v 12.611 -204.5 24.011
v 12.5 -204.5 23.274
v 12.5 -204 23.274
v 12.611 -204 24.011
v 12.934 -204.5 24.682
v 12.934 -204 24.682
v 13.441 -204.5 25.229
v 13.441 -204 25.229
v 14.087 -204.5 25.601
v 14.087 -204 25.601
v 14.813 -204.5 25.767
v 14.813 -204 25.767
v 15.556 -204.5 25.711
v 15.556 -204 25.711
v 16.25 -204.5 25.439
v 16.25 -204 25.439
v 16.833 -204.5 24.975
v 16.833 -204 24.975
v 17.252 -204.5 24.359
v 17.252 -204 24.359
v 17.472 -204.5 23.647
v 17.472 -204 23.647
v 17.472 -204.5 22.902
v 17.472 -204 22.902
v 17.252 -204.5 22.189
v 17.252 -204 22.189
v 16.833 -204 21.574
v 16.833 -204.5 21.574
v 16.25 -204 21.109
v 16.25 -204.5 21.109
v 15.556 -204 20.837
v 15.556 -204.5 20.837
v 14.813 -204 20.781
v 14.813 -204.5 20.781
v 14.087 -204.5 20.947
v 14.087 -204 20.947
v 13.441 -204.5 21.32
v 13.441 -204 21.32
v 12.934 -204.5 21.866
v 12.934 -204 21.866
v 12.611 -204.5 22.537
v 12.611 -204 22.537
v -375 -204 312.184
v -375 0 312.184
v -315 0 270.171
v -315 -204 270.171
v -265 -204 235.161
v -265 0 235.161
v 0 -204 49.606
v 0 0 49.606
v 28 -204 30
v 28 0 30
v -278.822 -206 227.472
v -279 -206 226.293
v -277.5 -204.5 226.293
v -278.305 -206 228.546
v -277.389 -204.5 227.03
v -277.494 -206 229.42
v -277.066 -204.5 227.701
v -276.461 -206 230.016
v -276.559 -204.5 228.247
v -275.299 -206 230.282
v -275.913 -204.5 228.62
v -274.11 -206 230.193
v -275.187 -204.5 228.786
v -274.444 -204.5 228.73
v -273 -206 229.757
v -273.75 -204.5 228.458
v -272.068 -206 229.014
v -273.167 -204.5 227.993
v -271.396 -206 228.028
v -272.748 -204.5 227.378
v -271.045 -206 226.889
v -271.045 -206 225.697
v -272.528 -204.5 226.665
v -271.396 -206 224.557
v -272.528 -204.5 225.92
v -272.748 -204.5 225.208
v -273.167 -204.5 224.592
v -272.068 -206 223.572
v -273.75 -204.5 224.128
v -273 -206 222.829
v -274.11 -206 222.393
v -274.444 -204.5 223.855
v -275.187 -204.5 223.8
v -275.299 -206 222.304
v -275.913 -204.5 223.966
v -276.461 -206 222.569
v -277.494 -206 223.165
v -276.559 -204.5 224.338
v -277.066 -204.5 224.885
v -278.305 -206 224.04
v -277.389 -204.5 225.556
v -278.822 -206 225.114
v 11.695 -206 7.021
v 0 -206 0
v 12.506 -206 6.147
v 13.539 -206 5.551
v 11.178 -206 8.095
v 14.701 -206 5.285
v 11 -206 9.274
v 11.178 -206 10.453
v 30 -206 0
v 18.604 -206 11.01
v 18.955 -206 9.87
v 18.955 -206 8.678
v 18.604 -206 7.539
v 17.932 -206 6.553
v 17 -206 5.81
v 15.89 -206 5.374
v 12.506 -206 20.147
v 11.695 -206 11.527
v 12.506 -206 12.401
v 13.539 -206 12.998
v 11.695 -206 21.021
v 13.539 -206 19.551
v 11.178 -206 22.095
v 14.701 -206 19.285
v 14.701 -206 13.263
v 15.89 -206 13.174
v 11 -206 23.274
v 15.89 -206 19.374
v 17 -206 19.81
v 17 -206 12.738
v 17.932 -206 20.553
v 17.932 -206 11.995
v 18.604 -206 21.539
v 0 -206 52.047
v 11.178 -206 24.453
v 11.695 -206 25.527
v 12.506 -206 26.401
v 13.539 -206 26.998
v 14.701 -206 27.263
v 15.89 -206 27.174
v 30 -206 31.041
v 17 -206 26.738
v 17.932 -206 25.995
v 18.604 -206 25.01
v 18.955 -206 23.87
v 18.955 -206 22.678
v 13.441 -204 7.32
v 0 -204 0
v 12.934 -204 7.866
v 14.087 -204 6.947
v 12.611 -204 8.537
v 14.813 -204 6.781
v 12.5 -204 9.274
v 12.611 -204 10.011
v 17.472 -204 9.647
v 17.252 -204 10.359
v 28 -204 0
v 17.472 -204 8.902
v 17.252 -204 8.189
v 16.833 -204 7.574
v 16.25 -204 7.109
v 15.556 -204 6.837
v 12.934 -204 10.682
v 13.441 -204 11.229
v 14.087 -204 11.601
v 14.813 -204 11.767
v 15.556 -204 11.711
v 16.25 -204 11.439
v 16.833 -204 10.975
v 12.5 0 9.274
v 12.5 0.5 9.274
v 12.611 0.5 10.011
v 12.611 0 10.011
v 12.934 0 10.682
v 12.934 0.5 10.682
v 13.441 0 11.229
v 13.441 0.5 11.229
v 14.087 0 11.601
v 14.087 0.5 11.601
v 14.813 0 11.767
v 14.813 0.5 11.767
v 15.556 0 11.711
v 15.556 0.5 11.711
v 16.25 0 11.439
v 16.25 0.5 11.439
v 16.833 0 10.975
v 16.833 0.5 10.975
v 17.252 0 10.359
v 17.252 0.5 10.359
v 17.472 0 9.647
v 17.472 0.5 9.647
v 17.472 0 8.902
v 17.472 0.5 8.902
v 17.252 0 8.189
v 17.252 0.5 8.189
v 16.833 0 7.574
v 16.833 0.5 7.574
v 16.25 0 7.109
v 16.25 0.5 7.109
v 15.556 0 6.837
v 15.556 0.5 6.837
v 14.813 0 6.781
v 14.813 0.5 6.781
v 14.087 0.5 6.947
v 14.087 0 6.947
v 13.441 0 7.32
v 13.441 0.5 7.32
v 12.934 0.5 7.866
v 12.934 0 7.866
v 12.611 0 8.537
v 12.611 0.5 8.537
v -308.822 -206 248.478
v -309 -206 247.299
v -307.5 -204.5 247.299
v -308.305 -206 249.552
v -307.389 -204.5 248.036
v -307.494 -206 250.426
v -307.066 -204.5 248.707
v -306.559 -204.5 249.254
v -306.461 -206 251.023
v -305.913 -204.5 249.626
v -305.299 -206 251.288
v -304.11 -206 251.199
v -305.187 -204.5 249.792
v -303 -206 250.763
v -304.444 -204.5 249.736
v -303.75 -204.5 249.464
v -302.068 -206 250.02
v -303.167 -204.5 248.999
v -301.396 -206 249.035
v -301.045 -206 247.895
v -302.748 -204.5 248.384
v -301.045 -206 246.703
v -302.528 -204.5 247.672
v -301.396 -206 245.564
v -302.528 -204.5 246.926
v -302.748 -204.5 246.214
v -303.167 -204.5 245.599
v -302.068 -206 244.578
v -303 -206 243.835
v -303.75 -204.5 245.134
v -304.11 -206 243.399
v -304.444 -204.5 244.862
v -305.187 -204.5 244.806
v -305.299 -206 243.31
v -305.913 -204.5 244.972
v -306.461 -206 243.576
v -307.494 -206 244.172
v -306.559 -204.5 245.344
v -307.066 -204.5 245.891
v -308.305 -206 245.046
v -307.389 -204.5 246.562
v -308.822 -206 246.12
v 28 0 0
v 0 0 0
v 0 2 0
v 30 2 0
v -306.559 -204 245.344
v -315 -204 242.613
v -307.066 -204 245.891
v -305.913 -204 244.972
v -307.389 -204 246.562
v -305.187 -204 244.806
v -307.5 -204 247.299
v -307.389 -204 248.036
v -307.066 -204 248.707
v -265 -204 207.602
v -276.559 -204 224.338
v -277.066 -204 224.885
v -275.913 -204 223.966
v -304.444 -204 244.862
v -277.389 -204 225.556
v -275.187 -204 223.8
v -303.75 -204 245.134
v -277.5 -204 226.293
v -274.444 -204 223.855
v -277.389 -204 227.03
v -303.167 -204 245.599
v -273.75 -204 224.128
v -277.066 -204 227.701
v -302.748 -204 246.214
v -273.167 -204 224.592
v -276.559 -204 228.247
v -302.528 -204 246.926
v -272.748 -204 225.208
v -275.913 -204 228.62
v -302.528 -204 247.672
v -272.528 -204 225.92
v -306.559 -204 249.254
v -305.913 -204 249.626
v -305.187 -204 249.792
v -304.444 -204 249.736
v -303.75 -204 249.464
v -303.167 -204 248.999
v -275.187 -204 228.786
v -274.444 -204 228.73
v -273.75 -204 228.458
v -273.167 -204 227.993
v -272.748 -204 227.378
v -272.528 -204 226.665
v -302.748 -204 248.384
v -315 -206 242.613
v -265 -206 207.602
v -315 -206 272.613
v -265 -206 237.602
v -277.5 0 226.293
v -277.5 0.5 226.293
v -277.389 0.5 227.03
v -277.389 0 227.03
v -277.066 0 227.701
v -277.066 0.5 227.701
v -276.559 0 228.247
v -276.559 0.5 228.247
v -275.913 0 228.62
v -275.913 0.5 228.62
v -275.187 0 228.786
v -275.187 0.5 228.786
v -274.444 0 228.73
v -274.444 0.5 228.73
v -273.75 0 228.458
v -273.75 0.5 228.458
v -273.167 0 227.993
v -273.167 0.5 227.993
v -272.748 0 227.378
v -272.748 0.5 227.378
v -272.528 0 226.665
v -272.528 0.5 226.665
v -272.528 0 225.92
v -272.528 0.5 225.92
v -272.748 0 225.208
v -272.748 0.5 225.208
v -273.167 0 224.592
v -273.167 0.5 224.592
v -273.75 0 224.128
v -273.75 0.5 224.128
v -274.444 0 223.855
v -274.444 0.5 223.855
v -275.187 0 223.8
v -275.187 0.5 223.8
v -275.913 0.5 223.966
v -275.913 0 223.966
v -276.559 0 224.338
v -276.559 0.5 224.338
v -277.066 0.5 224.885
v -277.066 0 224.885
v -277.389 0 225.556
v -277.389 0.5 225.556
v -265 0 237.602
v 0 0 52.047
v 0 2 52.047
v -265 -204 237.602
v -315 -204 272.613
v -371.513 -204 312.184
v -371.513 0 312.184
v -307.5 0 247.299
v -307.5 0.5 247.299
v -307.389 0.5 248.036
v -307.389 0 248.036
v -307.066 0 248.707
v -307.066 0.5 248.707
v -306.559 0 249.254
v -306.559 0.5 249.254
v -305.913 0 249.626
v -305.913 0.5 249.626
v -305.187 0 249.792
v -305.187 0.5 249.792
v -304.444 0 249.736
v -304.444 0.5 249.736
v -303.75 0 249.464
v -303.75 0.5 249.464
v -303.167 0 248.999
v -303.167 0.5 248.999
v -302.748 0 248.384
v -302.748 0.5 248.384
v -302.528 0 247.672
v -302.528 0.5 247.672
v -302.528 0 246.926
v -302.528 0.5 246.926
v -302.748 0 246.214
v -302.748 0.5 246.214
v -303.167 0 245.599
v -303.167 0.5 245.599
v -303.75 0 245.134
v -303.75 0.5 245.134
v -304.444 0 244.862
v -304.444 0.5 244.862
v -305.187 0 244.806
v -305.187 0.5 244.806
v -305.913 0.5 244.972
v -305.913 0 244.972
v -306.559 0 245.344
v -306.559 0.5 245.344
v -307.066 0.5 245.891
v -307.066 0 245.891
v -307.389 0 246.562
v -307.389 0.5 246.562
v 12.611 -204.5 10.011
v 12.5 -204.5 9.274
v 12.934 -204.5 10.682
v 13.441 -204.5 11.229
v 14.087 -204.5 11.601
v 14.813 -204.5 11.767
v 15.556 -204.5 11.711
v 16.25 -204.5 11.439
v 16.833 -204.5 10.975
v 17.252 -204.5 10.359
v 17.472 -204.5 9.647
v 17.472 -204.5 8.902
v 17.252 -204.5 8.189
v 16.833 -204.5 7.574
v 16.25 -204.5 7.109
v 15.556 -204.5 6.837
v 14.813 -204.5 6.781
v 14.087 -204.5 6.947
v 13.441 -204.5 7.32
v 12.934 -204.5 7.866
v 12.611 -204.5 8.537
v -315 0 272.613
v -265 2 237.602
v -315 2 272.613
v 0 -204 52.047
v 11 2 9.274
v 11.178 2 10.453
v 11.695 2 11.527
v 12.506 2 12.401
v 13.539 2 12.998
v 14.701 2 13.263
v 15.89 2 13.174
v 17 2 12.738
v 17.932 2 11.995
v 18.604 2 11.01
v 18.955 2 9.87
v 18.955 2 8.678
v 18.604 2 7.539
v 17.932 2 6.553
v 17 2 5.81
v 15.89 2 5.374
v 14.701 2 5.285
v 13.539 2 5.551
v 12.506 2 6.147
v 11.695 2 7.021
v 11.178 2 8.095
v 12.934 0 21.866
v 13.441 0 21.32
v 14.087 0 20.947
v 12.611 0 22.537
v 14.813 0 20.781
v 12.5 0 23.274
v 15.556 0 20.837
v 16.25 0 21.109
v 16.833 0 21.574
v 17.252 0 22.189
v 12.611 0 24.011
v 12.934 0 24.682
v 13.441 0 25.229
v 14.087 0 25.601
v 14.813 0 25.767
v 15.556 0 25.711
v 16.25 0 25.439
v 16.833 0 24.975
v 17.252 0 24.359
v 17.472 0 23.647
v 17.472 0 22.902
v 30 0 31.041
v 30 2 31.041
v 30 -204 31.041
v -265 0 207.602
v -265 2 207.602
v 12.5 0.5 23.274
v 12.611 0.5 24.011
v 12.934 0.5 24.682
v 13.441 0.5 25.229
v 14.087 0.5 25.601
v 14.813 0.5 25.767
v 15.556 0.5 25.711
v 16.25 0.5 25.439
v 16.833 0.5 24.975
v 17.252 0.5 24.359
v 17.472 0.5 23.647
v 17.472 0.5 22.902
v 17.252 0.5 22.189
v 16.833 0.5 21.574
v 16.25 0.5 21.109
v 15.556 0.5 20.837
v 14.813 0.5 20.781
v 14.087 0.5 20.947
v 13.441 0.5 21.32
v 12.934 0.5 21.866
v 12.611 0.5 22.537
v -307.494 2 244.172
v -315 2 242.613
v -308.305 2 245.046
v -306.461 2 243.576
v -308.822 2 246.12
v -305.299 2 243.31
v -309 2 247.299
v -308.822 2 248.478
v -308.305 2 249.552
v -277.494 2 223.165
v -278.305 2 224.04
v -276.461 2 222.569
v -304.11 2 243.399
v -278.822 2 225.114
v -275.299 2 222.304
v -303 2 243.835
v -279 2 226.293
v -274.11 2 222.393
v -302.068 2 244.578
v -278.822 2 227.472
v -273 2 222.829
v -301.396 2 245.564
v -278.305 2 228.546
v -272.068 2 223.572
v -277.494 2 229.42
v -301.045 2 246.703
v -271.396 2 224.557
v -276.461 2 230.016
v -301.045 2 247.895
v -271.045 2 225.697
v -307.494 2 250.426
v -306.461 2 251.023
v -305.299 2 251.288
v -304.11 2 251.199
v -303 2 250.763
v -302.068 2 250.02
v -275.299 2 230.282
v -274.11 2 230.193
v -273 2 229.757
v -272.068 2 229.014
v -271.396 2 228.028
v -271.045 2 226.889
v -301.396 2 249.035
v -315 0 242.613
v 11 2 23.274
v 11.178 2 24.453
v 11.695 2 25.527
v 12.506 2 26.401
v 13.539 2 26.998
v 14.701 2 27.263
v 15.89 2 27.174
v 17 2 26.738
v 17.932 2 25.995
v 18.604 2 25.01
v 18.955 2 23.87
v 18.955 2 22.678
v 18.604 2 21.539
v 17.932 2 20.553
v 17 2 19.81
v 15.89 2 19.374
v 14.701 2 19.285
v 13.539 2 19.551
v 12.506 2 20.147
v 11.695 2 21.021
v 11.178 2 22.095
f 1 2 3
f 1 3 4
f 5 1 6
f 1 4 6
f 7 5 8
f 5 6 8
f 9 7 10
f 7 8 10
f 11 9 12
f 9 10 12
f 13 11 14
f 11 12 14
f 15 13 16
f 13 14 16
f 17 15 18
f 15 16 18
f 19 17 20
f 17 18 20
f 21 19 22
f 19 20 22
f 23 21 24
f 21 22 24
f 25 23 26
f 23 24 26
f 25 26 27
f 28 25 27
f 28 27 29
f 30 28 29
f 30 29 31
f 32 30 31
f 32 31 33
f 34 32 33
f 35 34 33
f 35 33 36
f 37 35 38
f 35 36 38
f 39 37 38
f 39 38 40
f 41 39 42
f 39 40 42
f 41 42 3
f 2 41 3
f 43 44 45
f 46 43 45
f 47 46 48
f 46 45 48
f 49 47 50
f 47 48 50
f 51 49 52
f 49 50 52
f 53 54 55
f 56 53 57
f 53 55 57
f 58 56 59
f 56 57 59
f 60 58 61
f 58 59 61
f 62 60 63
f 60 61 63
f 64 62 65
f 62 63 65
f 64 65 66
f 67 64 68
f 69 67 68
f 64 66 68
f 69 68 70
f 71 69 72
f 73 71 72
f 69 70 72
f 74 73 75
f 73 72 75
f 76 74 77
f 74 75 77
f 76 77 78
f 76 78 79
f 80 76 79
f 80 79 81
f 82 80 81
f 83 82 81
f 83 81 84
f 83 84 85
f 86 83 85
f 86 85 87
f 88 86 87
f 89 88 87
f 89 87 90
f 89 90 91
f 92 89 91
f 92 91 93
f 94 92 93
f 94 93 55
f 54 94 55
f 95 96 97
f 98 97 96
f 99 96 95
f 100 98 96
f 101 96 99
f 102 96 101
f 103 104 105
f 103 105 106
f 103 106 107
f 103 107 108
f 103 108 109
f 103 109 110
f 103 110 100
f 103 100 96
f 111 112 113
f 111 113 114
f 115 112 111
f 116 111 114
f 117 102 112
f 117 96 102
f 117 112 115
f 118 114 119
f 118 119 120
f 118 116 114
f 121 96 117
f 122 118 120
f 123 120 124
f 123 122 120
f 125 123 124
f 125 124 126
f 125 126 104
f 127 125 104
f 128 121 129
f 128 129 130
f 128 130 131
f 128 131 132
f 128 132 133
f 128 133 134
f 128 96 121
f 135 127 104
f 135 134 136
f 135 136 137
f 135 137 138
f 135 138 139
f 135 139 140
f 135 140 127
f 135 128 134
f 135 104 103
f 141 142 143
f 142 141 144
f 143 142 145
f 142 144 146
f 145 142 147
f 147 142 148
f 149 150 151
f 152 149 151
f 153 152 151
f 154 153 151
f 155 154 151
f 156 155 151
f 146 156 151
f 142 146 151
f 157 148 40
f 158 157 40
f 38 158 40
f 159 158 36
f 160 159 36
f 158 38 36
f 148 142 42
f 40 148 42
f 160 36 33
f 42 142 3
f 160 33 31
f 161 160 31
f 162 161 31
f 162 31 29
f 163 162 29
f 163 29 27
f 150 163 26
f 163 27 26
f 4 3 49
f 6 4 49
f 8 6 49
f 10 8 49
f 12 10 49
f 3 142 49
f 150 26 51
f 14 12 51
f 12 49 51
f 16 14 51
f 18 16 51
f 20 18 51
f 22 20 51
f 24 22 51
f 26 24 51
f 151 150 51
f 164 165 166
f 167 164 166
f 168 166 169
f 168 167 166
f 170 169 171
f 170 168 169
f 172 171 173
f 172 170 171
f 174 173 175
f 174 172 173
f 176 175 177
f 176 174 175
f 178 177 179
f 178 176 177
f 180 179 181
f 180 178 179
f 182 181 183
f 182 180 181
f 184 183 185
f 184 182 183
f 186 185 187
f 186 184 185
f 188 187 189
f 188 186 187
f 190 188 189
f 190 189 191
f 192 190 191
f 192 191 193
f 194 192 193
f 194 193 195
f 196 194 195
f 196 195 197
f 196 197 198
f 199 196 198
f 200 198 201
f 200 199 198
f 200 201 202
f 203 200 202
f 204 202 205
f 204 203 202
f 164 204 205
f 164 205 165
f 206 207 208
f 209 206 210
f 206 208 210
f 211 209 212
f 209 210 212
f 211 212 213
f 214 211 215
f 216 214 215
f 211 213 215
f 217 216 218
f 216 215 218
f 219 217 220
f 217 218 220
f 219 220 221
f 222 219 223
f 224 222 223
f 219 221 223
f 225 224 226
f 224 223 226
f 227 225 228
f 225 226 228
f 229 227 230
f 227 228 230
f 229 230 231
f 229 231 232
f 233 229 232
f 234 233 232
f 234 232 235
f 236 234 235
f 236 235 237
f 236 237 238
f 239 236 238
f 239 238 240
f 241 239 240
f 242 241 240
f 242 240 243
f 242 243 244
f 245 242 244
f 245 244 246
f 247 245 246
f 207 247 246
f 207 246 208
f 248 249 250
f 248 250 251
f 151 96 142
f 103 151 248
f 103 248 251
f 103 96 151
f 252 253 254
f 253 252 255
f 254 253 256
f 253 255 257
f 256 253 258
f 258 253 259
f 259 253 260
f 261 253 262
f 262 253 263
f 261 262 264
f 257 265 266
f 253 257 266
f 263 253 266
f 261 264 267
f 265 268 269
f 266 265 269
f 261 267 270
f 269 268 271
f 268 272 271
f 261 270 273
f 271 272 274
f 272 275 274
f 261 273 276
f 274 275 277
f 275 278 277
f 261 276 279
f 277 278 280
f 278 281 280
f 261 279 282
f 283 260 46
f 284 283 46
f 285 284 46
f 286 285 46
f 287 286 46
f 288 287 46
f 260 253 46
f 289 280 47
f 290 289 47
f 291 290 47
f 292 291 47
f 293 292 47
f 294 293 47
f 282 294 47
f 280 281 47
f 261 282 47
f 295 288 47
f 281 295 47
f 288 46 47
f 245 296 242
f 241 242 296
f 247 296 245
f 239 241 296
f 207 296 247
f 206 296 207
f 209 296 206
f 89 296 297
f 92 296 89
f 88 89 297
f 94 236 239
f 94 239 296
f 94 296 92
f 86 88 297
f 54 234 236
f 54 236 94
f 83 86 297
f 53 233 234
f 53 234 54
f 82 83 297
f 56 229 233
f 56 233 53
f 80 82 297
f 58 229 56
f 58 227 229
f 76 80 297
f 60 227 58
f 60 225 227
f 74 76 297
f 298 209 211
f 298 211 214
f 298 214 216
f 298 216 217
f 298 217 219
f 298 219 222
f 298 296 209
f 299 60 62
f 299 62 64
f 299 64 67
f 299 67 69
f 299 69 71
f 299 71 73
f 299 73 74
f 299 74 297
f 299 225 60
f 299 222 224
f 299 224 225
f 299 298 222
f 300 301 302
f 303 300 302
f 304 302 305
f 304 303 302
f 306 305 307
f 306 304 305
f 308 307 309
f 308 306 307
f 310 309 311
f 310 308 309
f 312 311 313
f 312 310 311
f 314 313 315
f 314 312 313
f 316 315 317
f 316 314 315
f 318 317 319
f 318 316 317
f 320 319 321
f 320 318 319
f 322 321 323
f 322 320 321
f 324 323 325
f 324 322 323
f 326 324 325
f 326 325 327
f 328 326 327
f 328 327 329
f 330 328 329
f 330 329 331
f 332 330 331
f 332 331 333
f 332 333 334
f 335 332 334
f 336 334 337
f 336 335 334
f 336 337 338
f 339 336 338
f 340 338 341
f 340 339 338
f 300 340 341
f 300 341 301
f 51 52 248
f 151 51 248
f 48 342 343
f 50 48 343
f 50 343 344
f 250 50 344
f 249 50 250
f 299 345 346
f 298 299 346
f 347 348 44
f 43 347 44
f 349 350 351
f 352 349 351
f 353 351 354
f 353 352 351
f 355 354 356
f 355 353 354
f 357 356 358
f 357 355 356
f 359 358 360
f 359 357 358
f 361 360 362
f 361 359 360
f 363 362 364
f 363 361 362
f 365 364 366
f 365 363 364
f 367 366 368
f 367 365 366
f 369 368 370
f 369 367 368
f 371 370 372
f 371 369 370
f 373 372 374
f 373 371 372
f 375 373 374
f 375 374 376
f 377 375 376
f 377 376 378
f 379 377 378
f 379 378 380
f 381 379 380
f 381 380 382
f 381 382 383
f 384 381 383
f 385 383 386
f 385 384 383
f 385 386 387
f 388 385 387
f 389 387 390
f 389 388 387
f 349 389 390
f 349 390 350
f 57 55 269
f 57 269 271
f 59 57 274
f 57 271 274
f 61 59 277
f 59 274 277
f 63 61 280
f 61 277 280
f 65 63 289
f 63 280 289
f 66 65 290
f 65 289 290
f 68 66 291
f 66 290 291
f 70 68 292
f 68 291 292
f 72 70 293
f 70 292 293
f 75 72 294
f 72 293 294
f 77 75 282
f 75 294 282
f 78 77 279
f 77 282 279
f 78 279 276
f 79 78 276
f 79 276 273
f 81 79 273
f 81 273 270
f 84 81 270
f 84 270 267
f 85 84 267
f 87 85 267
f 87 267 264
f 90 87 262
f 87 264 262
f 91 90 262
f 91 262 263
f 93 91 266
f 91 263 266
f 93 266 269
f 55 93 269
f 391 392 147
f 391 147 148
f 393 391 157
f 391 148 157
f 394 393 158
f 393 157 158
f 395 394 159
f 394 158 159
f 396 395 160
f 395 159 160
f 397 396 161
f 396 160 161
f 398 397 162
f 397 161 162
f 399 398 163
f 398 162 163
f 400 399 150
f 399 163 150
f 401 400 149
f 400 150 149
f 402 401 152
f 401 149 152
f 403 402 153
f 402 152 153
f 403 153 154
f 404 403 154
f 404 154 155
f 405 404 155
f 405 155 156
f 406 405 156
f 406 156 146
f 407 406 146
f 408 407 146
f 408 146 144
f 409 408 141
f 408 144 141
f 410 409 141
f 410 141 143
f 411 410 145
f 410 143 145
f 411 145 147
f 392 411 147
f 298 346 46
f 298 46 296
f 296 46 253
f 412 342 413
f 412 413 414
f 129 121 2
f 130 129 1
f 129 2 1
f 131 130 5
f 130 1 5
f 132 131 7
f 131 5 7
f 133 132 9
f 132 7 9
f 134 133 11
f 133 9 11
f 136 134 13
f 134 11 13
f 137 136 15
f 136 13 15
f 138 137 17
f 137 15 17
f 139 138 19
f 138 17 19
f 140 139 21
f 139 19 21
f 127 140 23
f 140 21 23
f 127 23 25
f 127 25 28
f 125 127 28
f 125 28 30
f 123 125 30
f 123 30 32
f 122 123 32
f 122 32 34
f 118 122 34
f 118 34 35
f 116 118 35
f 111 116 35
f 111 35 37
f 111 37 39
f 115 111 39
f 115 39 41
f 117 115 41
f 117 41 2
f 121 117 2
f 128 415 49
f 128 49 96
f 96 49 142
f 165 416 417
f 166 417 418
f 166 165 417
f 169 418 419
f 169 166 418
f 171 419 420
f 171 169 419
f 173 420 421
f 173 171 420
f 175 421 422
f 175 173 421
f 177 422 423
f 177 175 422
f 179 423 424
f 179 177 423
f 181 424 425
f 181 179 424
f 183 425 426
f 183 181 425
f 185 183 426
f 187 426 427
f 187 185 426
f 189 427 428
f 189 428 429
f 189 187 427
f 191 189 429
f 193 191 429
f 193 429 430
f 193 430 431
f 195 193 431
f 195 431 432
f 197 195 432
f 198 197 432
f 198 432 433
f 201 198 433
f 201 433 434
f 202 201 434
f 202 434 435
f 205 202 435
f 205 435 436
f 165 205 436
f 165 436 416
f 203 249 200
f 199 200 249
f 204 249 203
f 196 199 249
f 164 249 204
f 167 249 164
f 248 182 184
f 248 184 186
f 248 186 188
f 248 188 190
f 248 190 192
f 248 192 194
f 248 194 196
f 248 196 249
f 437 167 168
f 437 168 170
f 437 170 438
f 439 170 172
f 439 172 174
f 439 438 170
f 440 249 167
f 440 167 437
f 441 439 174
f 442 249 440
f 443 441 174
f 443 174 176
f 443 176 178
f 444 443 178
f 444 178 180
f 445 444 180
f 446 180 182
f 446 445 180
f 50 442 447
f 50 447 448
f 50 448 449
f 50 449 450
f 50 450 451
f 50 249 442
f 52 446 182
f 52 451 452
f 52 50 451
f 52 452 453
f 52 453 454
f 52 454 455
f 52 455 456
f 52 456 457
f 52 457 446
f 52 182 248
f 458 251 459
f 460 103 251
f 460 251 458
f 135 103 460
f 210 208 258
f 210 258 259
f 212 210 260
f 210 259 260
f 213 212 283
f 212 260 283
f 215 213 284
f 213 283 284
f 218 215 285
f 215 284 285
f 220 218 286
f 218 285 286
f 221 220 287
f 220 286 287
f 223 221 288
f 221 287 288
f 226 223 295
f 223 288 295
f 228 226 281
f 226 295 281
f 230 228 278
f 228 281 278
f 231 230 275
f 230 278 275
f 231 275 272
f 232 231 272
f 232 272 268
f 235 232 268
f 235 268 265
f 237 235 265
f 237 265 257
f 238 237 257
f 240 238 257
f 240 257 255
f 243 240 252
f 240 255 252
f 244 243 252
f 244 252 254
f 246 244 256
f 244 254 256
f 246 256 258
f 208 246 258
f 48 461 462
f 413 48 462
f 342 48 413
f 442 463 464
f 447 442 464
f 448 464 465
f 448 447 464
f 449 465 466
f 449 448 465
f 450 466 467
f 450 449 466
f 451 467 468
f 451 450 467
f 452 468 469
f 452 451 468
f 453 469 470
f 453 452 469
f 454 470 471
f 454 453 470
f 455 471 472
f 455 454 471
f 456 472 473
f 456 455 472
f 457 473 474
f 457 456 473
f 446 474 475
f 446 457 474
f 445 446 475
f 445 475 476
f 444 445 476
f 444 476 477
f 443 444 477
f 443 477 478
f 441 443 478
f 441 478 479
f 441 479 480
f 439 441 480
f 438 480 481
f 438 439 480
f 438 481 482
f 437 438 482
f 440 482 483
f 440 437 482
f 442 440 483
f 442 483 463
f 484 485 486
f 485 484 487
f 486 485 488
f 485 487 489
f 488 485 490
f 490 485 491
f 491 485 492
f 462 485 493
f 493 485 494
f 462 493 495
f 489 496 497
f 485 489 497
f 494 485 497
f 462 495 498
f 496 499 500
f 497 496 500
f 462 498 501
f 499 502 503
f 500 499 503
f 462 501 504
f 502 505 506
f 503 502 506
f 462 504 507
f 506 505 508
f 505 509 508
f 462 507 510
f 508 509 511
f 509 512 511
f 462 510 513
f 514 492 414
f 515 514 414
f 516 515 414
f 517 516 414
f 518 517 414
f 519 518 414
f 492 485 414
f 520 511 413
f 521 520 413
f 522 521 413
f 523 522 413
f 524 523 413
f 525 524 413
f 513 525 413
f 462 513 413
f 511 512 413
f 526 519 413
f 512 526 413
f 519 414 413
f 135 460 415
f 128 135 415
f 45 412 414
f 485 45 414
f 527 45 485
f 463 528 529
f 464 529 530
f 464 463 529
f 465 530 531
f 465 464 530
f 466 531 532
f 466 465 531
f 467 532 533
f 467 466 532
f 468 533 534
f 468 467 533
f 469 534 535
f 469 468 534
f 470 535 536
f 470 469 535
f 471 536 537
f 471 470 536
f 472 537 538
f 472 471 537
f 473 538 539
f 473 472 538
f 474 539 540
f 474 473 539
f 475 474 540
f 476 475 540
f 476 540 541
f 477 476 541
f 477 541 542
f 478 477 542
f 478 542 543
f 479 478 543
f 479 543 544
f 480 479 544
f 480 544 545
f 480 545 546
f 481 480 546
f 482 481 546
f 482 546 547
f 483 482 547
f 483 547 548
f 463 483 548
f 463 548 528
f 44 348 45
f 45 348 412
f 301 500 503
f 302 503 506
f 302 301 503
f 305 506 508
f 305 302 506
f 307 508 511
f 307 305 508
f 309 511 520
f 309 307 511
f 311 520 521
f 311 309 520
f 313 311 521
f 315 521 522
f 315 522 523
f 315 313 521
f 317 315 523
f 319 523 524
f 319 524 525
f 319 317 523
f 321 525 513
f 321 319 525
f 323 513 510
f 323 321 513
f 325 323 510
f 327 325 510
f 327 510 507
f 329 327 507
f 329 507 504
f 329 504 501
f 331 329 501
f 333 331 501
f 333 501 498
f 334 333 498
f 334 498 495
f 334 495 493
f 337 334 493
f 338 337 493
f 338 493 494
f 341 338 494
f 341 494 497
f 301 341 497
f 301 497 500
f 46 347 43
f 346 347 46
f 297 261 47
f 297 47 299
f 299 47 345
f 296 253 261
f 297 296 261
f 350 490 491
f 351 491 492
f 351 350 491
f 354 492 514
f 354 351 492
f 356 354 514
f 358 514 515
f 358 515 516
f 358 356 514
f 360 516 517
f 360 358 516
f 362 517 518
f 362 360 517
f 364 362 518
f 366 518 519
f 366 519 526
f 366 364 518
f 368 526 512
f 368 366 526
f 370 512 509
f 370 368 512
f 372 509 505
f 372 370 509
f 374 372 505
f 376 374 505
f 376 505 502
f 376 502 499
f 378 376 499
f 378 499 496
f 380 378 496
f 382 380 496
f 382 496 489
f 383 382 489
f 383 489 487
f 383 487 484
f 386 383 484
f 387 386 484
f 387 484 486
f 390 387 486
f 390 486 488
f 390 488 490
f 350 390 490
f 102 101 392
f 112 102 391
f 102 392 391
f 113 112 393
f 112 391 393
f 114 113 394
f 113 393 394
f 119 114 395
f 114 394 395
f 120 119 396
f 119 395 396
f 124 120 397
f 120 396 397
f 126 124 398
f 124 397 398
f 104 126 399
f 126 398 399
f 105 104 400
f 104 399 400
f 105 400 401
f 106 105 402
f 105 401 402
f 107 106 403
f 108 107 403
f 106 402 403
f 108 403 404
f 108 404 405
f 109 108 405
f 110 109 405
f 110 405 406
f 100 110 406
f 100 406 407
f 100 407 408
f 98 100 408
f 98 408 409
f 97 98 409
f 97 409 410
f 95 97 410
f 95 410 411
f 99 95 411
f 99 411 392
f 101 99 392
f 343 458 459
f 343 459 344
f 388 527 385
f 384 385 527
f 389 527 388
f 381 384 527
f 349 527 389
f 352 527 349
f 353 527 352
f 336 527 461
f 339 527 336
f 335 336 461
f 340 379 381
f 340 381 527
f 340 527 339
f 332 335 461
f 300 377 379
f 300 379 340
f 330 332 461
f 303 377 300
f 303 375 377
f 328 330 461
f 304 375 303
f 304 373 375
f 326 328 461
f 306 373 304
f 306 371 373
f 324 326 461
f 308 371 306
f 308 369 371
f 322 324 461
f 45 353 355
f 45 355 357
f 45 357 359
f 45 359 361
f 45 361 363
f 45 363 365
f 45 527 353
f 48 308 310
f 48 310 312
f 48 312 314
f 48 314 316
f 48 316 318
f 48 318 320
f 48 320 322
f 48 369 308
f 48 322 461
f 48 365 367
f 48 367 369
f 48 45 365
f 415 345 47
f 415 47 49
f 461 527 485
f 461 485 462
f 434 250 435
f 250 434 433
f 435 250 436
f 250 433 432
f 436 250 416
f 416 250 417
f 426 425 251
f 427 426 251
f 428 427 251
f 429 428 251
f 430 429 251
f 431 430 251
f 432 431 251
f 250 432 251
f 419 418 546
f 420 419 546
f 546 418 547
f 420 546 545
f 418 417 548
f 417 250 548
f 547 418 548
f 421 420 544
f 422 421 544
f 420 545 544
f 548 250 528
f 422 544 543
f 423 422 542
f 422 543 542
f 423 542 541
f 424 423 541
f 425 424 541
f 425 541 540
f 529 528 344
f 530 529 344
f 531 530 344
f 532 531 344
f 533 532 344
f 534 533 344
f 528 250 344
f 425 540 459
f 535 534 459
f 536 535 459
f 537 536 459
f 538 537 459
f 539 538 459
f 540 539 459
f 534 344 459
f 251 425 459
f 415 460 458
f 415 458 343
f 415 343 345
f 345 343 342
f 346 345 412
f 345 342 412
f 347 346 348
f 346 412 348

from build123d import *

# Parameters (mm, degrees)
F1_DEPTH       = 204
F5_DEPTH       = 2
F7_D           = 5
F7_DEPTH       = 10
F7_CSINK_D     = 8
F7_CSINK_ANGLE = 90
F8_D           = 5
F8_DEPTH       = 10
F8_CSINK_D     = 8
F8_CSINK_ANGLE = 90


with BuildPart() as f1:
    # F0 (on Front) → F1 (new body)
    with BuildSketch(Plane.XZ):
        Polygon((30, 0), (30, 31.041134), (-371.513106, 312.183638), (-375, 312.183638), (28, 30), (28, 0), align=None)
    extrude(amount=F1_DEPTH)

    # F4 (on offset) → F5 (join)
    with BuildSketch(Plane.XZ.offset(204)):
        Polygon((0, 52.04736), (0, 0), (30, 0), (30, 31.041134), align=None)
        Polygon((-265, 237.602358), (-315, 272.612735), (-315, 242.612735), (-265, 207.602358), align=None)
    extrude(amount=F5_DEPTH)

    # F7
    with Locations(Plane.XZ.offset(206)):
        with Locations((15, 23.274141), (15, 9.274141)):
            CounterSinkHole(F7_D / 2, F7_CSINK_D / 2, depth=F7_DEPTH, counter_sink_angle=F7_CSINK_ANGLE)

    # F8
    with Locations(Plane.XZ.offset(206)):
        with Locations((-305, 247.299041), (-275, 226.292814)):
            CounterSinkHole(F8_D / 2, F8_CSINK_D / 2, depth=F8_DEPTH, counter_sink_angle=F8_CSINK_ANGLE)

    # F9: F1 across plane


with BuildPart() as f1_1:
    add(f1.part)
    add(f1.part.mirror(Plane.XZ.offset(102)))


solid = f1_1.part
